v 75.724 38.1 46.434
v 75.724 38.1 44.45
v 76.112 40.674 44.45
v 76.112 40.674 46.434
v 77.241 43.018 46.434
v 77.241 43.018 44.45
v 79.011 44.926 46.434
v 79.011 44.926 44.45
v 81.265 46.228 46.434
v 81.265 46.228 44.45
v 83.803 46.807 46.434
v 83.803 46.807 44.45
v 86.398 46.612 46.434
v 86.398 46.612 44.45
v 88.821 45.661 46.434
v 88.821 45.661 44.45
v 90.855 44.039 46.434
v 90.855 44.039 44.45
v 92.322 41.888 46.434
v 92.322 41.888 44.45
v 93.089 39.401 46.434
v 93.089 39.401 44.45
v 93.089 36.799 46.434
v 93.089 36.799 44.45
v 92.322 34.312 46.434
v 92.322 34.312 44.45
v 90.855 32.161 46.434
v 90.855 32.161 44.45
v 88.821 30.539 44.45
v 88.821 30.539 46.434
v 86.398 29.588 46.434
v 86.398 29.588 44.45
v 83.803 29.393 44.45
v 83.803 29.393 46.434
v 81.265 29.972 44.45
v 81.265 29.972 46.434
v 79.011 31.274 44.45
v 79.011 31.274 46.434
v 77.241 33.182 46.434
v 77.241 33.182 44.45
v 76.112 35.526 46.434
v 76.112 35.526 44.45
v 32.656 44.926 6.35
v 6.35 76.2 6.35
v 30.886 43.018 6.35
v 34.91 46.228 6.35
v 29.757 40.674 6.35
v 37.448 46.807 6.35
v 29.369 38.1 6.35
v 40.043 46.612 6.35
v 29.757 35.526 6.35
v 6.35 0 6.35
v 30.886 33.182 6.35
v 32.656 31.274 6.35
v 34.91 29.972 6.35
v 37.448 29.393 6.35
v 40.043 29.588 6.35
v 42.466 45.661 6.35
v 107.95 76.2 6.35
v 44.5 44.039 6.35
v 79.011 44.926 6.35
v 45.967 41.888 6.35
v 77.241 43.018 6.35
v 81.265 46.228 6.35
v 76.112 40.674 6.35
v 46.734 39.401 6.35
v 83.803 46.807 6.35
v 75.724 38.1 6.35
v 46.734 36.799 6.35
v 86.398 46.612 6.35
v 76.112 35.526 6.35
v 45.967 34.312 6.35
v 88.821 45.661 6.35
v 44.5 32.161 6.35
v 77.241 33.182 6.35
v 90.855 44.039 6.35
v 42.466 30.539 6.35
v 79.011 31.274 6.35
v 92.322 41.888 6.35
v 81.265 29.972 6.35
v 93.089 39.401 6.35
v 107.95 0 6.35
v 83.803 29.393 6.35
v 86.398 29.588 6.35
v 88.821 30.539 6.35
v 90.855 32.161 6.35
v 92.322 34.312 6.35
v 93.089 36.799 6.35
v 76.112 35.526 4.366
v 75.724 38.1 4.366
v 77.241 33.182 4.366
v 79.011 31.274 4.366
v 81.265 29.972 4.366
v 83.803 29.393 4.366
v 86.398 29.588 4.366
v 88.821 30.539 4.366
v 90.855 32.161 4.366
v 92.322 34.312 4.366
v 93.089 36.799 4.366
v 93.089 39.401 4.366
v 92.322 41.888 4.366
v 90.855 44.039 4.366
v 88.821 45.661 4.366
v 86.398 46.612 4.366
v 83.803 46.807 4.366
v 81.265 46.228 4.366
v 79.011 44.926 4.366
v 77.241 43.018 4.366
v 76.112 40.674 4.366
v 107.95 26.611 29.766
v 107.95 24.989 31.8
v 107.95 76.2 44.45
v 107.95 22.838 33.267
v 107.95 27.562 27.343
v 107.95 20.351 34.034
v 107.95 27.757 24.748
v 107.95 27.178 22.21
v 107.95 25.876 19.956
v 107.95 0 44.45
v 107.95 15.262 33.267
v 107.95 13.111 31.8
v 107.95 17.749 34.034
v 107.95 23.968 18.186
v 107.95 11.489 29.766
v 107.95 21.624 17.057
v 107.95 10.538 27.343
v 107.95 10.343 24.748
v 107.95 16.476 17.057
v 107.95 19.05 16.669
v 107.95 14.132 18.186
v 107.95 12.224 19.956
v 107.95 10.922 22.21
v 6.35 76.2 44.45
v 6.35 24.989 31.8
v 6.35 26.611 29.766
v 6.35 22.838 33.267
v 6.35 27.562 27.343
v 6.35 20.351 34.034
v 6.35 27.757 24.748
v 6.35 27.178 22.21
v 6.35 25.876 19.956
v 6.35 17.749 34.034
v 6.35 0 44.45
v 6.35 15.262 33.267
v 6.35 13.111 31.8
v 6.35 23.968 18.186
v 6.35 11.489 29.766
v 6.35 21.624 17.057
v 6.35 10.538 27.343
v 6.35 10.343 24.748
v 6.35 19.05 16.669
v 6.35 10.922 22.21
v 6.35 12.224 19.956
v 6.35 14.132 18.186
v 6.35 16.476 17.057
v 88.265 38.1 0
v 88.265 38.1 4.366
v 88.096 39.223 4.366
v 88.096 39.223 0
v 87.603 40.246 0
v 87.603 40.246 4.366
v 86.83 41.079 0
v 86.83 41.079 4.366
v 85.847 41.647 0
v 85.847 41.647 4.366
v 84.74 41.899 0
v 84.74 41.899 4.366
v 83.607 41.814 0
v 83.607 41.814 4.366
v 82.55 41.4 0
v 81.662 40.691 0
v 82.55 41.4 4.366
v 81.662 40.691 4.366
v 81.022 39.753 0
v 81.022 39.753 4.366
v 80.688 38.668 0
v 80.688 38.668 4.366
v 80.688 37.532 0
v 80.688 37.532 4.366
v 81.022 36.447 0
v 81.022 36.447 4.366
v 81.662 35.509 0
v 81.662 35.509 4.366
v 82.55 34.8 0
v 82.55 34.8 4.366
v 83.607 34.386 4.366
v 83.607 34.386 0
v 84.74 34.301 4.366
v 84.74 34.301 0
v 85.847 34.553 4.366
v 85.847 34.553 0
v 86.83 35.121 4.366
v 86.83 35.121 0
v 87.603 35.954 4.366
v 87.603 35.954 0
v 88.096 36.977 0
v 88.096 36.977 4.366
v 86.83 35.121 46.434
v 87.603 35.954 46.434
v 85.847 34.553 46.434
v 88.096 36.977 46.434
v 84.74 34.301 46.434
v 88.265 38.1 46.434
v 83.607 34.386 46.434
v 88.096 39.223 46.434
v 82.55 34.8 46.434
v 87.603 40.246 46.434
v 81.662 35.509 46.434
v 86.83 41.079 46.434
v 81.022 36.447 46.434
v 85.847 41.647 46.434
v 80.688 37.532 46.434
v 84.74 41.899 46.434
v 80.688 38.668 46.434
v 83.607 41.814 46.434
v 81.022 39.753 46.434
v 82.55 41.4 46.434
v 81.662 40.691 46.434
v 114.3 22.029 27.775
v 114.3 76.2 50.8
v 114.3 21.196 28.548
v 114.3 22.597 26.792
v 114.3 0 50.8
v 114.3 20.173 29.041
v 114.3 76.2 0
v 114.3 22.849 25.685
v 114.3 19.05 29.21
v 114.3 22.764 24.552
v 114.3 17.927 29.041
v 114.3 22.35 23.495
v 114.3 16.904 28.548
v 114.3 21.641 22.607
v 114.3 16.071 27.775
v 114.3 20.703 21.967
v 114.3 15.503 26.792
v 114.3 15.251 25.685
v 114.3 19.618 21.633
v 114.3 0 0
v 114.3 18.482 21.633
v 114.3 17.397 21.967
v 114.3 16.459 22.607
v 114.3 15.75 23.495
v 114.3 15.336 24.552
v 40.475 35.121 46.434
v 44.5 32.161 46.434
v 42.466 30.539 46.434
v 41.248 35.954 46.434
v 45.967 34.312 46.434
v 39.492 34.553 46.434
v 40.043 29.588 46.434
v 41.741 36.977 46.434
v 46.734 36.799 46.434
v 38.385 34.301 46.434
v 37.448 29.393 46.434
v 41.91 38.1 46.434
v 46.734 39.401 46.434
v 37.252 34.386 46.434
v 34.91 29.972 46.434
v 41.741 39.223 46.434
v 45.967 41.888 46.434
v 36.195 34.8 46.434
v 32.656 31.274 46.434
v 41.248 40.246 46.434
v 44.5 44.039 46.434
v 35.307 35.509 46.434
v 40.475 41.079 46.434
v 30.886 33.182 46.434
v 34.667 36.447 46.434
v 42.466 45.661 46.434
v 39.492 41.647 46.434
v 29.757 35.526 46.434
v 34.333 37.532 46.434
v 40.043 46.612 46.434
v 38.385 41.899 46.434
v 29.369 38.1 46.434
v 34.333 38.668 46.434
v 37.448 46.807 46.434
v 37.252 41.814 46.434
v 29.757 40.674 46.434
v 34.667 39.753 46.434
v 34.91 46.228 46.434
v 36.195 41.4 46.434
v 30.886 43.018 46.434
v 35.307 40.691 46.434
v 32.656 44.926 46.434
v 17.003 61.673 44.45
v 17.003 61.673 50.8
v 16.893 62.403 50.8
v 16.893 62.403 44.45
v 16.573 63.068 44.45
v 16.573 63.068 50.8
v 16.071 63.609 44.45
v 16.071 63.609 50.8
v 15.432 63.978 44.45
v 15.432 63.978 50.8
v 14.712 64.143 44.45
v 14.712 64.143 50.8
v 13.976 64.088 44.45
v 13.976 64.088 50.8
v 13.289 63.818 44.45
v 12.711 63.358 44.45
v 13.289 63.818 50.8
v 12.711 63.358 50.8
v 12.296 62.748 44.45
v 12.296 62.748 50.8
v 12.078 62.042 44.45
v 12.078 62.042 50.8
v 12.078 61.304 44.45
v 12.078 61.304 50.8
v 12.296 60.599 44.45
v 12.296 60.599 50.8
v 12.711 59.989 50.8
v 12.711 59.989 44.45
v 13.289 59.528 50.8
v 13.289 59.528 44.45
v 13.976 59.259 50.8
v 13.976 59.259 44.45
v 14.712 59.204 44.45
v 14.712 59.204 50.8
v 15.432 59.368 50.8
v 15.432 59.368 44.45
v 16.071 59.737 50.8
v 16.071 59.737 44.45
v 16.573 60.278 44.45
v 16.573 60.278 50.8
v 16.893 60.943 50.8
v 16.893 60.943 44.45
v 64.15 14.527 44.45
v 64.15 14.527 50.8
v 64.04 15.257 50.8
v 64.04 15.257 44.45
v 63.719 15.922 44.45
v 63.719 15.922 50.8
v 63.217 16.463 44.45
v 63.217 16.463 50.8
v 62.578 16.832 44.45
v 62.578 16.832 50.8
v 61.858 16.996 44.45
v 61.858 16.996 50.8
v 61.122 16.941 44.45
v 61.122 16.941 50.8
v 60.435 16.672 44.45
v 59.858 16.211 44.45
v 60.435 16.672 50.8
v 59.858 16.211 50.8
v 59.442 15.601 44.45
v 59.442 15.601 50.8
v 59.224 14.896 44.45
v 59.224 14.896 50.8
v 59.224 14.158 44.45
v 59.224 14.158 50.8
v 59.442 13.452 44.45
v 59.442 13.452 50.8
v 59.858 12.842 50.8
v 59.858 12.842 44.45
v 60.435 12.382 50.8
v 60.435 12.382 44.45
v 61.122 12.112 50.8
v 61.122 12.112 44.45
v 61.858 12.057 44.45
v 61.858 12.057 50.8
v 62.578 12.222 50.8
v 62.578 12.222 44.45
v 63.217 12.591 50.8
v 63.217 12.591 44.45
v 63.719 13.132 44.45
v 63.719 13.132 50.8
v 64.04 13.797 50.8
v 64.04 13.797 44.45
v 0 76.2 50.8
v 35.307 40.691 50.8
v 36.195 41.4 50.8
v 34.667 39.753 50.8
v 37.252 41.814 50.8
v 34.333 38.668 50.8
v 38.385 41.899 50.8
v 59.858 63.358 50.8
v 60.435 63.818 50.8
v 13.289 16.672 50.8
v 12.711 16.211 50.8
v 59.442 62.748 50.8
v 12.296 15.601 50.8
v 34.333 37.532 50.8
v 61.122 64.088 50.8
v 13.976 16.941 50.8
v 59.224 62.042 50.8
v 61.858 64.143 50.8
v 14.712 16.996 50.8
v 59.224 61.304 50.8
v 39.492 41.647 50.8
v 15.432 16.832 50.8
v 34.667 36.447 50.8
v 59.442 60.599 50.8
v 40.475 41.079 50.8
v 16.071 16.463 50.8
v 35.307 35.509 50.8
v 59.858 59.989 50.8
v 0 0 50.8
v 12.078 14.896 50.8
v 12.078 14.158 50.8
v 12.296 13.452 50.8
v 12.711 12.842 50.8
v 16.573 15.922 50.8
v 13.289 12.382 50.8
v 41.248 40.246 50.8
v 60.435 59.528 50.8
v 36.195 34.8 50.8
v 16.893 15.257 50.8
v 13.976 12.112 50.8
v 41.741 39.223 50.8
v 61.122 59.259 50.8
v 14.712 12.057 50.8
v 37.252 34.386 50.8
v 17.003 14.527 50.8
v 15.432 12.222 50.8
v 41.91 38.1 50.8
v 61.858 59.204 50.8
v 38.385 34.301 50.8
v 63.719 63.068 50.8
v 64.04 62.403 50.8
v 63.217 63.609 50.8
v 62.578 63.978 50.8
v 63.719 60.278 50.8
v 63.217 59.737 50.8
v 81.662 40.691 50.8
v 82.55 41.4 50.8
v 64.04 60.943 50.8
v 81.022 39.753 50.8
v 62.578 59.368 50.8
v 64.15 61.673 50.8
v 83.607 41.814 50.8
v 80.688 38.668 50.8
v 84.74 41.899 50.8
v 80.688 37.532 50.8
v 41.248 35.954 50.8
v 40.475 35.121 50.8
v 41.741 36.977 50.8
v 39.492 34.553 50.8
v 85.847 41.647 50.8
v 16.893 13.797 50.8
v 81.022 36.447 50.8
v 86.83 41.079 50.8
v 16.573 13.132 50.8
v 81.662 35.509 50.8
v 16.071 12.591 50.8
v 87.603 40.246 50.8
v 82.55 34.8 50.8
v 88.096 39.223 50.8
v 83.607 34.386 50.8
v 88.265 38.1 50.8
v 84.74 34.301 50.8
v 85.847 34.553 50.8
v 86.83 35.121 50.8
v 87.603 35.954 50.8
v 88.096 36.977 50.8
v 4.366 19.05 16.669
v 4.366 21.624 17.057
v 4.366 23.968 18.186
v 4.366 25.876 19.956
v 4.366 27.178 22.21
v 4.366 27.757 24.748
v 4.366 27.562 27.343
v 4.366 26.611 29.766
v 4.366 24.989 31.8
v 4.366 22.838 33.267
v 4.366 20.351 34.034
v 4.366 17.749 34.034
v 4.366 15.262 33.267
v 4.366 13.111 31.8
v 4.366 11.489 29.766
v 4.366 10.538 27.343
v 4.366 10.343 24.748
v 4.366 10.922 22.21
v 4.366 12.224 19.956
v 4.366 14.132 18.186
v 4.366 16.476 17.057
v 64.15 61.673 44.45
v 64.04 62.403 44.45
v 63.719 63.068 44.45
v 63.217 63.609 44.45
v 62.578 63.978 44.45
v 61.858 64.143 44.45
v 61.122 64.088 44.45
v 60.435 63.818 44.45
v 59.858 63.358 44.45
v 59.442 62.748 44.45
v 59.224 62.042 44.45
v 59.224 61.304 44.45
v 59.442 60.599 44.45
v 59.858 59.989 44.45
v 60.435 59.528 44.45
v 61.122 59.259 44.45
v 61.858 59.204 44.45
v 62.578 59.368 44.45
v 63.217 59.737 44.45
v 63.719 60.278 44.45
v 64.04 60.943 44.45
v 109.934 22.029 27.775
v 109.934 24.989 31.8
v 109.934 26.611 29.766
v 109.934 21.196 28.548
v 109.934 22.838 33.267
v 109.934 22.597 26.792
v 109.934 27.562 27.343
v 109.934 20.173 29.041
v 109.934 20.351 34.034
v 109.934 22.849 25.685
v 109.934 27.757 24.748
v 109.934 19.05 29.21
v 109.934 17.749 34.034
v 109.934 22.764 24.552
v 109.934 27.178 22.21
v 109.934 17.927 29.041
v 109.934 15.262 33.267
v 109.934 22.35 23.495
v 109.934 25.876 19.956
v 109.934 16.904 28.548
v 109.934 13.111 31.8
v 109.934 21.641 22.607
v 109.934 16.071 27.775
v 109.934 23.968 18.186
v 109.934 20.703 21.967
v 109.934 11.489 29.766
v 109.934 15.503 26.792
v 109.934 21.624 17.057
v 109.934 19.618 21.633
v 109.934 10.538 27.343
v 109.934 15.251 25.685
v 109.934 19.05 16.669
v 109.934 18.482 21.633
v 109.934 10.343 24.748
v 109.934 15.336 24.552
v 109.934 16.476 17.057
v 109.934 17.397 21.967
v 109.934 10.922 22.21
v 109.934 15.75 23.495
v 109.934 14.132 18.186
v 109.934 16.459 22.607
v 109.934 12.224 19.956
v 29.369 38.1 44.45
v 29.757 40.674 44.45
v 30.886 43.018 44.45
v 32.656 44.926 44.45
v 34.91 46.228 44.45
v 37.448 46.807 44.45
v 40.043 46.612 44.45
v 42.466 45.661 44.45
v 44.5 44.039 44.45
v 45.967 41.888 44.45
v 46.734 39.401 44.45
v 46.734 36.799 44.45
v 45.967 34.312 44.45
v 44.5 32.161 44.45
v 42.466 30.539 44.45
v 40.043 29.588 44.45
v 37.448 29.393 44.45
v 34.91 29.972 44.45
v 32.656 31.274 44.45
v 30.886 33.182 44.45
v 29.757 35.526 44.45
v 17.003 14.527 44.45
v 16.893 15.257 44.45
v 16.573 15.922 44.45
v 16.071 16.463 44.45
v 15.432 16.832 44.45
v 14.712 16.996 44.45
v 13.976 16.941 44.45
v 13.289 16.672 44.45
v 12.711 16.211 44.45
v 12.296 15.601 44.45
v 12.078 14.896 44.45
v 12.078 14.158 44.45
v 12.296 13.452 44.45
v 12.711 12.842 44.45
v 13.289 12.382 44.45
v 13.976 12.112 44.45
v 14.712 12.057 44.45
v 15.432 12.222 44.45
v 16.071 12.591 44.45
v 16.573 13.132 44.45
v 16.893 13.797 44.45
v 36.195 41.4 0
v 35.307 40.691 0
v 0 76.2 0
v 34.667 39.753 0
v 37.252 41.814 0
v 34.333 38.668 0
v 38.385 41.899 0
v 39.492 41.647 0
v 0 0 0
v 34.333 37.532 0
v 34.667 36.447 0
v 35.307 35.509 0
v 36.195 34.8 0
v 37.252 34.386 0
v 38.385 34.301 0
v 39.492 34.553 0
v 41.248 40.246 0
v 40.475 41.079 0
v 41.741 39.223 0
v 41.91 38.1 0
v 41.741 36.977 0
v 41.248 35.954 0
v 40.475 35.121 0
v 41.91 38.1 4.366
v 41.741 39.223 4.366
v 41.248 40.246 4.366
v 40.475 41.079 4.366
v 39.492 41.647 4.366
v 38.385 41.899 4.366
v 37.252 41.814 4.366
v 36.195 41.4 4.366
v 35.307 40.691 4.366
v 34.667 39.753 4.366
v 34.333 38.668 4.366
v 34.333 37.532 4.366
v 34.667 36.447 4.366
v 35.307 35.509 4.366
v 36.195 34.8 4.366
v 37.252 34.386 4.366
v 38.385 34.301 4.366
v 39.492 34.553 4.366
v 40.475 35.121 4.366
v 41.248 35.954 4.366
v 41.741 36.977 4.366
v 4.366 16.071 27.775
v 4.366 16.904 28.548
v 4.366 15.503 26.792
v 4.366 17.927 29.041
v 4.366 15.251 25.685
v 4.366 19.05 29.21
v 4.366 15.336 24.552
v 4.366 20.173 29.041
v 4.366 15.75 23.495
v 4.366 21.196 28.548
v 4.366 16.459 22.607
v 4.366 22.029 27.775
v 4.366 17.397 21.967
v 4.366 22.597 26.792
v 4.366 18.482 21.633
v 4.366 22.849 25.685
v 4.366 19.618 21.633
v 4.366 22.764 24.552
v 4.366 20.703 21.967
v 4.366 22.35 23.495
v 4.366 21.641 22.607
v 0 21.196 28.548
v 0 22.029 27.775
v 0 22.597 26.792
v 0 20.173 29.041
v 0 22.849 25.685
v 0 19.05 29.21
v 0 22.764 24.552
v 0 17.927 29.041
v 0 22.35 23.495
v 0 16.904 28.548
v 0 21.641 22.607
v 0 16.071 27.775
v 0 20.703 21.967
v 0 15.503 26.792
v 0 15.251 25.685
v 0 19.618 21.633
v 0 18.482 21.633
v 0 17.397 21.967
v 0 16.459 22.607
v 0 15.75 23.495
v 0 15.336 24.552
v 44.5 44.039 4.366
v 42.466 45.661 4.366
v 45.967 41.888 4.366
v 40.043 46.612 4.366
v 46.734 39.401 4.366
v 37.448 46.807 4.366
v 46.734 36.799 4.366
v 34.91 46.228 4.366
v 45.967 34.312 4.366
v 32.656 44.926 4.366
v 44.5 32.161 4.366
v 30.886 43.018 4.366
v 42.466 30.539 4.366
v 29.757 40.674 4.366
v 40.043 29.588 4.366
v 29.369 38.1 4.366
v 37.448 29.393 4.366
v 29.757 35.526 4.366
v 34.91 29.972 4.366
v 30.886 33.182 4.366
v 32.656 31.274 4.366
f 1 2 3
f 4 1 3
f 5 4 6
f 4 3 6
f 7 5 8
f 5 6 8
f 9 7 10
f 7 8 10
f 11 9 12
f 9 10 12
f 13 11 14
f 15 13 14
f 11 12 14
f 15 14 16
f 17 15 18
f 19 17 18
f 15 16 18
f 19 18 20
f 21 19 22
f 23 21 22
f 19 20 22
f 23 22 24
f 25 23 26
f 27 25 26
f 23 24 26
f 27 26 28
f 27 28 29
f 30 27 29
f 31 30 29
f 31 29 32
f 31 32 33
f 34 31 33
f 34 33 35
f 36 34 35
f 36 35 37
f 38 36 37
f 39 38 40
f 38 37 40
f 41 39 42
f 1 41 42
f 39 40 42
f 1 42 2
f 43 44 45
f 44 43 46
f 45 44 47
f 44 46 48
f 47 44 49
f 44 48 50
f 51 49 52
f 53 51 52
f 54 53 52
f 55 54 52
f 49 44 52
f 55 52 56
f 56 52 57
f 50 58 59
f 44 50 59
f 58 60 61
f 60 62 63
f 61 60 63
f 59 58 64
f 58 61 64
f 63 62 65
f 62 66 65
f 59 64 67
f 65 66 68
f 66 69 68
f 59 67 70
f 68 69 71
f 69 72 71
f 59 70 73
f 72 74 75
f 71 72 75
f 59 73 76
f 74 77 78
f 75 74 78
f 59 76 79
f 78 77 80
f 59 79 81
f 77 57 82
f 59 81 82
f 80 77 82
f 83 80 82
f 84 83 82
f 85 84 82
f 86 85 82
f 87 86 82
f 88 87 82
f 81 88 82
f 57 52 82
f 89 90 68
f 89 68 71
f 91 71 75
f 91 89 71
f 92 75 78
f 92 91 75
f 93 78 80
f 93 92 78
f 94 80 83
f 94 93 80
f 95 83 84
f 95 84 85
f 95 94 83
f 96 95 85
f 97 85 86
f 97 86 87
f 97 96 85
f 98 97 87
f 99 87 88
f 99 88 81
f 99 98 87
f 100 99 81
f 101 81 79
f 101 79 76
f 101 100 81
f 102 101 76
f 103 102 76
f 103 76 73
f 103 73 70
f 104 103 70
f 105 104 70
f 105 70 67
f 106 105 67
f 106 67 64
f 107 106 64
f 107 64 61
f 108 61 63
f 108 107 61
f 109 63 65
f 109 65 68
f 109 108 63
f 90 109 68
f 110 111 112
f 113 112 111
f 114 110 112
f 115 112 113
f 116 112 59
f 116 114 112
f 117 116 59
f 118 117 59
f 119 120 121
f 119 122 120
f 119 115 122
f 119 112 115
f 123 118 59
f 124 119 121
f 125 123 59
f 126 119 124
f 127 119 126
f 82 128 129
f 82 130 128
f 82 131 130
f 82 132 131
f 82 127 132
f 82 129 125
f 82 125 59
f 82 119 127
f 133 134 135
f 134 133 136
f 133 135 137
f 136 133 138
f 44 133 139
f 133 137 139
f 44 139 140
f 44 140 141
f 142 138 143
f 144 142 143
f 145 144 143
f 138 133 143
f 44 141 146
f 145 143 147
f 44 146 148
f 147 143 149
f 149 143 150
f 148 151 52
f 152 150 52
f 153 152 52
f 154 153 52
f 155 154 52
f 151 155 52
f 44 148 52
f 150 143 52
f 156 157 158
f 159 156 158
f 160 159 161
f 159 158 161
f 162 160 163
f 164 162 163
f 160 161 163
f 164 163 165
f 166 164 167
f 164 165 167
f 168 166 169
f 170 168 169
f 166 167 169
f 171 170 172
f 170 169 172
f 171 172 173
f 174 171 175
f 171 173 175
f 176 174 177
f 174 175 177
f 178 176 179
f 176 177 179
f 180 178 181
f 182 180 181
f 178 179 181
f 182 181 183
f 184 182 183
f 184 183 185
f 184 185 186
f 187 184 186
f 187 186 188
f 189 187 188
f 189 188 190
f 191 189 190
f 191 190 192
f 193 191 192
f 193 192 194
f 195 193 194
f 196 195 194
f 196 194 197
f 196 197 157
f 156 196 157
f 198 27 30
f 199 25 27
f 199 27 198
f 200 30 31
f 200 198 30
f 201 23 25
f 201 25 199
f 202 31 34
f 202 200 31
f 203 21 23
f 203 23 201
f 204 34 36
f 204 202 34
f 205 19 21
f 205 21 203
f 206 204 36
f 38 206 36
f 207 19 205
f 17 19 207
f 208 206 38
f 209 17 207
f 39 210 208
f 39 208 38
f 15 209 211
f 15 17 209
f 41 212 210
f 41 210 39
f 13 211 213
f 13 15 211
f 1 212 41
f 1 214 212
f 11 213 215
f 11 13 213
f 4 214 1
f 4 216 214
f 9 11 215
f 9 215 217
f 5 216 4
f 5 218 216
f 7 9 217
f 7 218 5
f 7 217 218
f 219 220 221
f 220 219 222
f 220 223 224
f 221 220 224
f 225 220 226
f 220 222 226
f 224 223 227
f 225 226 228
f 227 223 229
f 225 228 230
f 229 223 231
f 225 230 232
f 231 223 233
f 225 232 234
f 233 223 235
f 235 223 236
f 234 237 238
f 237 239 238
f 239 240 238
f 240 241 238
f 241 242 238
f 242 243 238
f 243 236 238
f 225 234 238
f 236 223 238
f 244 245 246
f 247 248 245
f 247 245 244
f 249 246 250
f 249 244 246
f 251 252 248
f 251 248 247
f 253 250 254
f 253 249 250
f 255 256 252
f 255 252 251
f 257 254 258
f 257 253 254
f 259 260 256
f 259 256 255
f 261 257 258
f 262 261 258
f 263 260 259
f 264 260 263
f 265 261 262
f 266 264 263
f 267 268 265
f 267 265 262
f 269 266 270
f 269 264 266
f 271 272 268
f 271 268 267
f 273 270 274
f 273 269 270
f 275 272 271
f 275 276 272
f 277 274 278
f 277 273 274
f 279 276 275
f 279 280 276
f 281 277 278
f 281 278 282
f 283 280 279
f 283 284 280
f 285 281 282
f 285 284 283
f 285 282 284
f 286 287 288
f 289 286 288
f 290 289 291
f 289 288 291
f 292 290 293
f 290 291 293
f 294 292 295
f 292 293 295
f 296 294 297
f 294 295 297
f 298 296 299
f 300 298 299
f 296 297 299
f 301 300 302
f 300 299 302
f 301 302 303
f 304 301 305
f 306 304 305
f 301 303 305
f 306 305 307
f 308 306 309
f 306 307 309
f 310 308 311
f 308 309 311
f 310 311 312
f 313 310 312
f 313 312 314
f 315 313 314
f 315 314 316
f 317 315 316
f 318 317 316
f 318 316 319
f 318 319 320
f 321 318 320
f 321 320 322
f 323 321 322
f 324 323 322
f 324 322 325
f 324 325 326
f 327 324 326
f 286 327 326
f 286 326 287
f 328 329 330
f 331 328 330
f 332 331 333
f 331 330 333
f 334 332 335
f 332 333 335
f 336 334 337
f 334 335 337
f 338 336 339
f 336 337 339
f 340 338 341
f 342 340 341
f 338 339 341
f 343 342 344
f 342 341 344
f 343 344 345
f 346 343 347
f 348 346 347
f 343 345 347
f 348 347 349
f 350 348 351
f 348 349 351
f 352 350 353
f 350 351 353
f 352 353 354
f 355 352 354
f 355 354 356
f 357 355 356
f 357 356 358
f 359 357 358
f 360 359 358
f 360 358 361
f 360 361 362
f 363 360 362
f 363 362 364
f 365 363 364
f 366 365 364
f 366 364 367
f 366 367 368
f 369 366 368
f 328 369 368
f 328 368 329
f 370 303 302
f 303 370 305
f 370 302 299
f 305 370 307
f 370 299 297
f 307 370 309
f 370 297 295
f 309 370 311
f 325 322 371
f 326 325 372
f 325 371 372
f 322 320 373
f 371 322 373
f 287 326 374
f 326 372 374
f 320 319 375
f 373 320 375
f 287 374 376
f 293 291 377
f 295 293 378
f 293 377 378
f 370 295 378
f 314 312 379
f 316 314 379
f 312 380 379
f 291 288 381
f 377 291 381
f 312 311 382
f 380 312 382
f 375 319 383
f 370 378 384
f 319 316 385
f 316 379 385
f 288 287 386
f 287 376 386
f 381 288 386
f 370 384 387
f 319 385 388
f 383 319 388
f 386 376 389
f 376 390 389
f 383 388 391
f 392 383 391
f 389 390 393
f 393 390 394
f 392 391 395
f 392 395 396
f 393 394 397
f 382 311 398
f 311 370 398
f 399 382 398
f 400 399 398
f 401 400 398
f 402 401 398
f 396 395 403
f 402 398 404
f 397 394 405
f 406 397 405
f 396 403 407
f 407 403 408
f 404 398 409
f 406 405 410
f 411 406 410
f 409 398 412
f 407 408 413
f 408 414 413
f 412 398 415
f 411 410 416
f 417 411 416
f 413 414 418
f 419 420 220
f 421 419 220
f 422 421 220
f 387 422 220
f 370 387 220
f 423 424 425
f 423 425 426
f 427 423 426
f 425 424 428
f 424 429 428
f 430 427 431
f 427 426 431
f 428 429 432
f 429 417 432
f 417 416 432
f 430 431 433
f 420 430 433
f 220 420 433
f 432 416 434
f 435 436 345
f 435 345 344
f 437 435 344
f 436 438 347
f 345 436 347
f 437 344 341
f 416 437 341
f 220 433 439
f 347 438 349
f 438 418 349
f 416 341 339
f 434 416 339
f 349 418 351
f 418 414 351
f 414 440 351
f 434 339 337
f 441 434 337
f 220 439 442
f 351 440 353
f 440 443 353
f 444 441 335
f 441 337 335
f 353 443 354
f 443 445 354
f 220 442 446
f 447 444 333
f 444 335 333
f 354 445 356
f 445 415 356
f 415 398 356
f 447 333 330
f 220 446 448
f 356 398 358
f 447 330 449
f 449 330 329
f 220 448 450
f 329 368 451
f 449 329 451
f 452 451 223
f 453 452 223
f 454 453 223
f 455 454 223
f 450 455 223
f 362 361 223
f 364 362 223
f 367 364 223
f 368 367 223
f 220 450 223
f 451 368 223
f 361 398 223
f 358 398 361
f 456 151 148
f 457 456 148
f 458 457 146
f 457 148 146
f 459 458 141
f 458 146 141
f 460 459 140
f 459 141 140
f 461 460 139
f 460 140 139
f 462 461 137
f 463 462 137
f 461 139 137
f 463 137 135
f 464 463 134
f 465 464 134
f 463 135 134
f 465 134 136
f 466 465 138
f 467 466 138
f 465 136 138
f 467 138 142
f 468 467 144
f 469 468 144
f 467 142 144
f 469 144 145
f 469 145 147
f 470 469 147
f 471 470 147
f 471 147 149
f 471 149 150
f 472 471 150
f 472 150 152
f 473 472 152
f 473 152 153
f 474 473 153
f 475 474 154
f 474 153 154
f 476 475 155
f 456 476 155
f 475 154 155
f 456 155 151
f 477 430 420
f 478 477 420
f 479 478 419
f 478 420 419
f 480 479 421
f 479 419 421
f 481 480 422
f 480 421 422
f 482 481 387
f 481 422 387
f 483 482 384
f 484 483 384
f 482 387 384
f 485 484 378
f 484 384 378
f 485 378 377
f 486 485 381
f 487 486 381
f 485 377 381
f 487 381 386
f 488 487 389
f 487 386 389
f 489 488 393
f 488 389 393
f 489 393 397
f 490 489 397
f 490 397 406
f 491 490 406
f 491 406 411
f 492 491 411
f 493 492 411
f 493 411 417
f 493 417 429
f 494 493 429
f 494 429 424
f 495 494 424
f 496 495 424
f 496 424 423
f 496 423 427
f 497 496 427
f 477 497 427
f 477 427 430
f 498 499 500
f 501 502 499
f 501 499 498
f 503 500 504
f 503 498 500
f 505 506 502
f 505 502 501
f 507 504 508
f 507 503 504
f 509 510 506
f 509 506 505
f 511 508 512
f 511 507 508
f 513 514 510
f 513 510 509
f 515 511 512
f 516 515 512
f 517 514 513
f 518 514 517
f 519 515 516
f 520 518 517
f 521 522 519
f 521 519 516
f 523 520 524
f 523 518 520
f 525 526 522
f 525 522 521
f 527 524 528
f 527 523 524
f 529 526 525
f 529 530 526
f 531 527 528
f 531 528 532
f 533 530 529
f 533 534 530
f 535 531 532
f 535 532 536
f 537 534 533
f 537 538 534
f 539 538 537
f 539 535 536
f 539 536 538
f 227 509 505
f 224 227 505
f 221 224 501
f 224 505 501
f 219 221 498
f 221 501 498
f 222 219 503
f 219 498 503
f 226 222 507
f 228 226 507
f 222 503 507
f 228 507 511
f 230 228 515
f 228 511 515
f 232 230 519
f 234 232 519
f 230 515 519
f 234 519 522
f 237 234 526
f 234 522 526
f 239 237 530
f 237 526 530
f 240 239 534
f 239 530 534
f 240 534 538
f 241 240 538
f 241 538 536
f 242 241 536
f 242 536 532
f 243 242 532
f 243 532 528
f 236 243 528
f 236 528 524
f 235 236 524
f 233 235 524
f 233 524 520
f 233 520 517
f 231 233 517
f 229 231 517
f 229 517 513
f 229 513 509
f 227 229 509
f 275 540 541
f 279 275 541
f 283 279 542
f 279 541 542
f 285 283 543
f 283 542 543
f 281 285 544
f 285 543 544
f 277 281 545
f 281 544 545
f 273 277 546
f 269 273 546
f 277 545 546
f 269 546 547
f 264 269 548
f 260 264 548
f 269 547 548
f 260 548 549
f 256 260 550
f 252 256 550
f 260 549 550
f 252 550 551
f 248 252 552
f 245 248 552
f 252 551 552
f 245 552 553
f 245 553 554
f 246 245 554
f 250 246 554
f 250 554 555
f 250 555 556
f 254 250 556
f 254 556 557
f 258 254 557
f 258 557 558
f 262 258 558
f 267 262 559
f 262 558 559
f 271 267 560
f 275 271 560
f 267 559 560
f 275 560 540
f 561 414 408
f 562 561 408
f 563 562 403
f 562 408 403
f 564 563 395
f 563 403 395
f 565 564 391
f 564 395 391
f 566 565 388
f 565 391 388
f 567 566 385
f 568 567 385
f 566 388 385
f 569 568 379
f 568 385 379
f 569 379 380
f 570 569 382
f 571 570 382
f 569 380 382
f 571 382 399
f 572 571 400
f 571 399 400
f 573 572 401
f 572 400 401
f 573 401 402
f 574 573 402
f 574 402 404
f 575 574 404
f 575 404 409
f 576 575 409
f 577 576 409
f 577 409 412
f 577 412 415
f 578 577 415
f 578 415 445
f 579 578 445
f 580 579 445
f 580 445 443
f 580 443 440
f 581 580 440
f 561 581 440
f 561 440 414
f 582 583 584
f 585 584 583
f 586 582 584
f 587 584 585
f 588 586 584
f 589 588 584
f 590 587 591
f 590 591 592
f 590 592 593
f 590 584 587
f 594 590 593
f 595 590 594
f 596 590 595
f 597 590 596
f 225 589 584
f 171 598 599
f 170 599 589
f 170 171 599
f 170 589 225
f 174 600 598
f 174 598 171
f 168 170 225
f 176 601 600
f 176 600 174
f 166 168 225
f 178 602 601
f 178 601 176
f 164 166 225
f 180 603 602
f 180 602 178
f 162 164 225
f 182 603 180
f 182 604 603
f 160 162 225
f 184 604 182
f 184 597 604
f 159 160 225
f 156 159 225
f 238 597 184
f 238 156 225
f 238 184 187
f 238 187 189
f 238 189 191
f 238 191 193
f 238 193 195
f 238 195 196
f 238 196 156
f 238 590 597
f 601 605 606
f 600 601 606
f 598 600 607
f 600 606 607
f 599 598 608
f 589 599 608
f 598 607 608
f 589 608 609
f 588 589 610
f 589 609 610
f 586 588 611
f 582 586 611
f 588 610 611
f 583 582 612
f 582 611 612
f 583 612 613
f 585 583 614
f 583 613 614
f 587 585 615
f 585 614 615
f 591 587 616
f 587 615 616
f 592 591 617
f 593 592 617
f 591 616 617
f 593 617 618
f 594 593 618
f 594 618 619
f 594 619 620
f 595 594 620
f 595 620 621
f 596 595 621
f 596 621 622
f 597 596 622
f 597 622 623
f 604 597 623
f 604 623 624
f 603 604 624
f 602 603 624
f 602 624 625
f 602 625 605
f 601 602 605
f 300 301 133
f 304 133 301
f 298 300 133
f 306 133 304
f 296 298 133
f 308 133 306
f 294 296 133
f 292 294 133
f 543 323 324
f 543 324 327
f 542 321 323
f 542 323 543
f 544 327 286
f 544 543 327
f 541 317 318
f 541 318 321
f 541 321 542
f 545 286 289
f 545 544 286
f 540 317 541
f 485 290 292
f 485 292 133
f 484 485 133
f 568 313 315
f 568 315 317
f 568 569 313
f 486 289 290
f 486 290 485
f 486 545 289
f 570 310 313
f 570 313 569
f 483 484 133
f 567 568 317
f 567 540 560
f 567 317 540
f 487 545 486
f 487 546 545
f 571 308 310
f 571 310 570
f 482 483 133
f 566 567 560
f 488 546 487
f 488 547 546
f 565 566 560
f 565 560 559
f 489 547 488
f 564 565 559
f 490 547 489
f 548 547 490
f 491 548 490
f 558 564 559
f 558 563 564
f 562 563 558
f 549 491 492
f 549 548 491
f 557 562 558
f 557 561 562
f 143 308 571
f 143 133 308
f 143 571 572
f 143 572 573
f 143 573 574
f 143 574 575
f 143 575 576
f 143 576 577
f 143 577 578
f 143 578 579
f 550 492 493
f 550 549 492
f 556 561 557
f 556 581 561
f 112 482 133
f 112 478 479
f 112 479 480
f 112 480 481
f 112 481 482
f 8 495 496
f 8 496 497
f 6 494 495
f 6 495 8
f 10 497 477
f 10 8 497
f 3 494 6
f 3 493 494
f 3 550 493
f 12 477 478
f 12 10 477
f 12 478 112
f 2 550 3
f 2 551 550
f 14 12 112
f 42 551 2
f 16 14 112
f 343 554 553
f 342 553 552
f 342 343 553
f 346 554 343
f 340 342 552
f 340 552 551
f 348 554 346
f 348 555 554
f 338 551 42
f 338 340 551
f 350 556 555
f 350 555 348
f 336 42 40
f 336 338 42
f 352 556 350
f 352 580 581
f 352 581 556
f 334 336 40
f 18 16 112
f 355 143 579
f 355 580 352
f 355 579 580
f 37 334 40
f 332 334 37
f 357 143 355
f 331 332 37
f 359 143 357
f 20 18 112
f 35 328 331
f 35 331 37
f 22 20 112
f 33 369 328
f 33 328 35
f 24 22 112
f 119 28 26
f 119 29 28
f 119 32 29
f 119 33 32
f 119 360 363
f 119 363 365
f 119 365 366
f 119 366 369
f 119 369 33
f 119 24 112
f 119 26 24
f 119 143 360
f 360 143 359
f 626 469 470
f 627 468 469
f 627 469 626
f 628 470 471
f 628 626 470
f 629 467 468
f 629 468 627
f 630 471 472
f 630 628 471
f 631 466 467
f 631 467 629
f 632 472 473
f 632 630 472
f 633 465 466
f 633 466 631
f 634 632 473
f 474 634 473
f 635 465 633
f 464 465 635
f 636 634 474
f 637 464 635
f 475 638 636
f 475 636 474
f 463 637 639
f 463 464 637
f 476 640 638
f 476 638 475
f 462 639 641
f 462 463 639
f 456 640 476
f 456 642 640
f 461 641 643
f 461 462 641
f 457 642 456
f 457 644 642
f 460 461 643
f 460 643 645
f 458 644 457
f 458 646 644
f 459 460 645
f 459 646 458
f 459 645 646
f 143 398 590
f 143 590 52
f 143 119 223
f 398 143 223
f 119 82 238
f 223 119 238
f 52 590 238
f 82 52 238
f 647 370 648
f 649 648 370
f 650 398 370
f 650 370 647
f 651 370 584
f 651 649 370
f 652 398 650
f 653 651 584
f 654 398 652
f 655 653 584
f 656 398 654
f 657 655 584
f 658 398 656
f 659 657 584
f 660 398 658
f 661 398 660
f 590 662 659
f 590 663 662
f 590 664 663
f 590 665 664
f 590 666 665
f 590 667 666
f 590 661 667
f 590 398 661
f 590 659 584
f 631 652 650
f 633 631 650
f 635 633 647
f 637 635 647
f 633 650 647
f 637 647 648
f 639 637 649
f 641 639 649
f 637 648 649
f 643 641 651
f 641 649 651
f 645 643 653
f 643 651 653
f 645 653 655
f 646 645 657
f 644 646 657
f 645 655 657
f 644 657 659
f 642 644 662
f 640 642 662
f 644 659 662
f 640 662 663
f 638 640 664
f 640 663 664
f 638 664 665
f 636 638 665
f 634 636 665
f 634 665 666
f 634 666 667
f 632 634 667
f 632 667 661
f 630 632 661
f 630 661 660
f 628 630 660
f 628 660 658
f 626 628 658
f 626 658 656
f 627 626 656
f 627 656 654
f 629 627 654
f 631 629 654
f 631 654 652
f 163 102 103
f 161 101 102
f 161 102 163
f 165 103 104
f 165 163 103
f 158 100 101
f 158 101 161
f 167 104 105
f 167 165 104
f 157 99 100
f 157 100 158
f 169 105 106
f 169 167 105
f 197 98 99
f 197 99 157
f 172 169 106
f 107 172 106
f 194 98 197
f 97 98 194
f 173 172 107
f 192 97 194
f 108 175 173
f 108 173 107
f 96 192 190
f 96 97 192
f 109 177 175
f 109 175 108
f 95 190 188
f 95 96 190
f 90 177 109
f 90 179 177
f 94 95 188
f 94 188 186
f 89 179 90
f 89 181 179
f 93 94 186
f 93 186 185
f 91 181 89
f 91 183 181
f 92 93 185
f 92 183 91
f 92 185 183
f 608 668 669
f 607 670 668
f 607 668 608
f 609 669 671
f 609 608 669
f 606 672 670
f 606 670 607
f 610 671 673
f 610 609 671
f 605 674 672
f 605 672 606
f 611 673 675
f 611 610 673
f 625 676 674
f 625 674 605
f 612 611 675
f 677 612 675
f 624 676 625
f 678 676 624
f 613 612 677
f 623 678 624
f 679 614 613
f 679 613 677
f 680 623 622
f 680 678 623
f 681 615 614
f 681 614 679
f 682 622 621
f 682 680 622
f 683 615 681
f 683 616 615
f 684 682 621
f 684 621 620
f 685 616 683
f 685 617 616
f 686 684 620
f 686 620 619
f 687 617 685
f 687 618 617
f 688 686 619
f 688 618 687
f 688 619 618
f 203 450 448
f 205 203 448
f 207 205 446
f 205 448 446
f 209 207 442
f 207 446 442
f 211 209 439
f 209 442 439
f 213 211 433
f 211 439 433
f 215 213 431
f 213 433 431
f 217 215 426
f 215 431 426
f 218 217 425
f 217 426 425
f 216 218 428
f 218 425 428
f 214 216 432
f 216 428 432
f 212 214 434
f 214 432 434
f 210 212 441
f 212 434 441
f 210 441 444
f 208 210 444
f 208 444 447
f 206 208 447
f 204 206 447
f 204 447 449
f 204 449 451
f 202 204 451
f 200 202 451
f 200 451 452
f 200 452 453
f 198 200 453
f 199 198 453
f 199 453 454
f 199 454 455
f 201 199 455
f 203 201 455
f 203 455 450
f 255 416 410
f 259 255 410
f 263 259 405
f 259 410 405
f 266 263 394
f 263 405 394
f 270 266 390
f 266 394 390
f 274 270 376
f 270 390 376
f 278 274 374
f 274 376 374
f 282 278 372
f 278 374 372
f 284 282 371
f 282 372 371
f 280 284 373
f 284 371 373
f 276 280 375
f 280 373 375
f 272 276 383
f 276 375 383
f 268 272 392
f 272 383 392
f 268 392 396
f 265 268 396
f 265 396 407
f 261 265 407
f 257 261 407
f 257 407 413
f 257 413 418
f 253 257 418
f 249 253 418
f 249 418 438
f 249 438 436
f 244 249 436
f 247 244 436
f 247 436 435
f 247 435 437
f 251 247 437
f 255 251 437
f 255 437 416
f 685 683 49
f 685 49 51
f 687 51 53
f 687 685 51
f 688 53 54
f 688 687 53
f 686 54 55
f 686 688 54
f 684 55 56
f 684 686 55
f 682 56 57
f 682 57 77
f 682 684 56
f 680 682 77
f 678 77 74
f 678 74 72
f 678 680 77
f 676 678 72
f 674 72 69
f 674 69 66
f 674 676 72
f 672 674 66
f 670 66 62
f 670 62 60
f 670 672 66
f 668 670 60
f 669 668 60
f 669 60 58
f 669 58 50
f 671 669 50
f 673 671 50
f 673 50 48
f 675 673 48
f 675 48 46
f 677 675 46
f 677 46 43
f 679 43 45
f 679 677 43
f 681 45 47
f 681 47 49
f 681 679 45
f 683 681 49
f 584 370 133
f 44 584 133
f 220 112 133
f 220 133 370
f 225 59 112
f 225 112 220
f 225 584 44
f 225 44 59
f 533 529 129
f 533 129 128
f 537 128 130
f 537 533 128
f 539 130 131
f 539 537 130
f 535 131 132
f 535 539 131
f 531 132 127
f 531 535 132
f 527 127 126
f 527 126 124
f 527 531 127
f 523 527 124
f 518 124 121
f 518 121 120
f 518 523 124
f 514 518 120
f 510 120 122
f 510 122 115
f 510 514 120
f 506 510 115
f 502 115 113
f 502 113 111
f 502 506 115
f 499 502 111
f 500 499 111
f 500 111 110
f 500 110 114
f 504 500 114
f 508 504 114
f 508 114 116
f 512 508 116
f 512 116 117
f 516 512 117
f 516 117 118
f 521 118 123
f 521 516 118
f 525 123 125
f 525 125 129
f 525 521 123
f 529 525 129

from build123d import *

# Parameters (mm, degrees)
SKETCH1_W           = 114.3
SKETCH1_H           = 50.8
SKETCH1_W_2         = 101.6
SKETCH1_H_2         = 38.1
BOSS_EXTRUDE1_DEPTH = 76.2
CUT_EXTRUDE1_REACH  = 148.464
SKETCH2_R           = 2.4765
SKETCH2_5_R         = 3.81
CUT_EXTRUDE2_DEPTH  = 147.463544952
SKETCH5_R           = 3.81
CUT_EXTRUDE4_DEPTH  = 147.463544952
SKETCH6_R           = 3.81
CUT_EXTRUDE5_DEPTH  = 147.463544952
SKETCH7_R           = 8.73125
CUT_EXTRUDE6_DEPTH  = 1.984375
SKETCH8_R           = 8.73125
CUT_EXTRUDE7_DEPTH  = 1.984375
CUT_EXTRUDE8_START  = -1.984375
SKETCH9_R           = 8.73125
CUT_EXTRUDE8_DEPTH  = 1.984375
CUT_EXTRUDE9_START  = -1.984375
SKETCH10_R          = 8.73125
CUT_EXTRUDE9_DEPTH  = 1.984375


with BuildPart() as part:
    # Sketch1 → Boss-Extrude1 (new body)
    with BuildSketch(Plane(origin=(0, 0, 0), x_dir=(1, 0, 0), z_dir=(0, 1, 0))):
        with Locations((57.15, -25.4)):
            Rectangle(SKETCH1_W, SKETCH1_H)
        with Locations((57.15, -25.4)):
            Rectangle(SKETCH1_W_2, SKETCH1_H_2, mode=Mode.SUBTRACT)
    extrude(amount=BOSS_EXTRUDE1_DEPTH)

    # Sketch2 → Cut-Extrude1 (cut, up to next)
    with BuildSketch(Plane.XY.offset(50.8), mode=Mode.PRIVATE) as cut_extrude1_sk1:
        with Locations((14.526827682, 61.673172318)):
            Circle(SKETCH2_R)
    cut_extrude1_tool1 = extrude(cut_extrude1_sk1.sketch, amount=-CUT_EXTRUDE1_REACH, mode=Mode.PRIVATE) & part.part
    # Sketch2 → Cut-Extrude1 (cut, up to next)
    with BuildSketch(Plane.XY.offset(50.8), mode=Mode.PRIVATE) as cut_extrude1_sk2:
        with Locations((61.673172318, 61.673172318)):
            Circle(SKETCH2_R)
    cut_extrude1_tool2 = extrude(cut_extrude1_sk2.sketch, amount=-CUT_EXTRUDE1_REACH, mode=Mode.PRIVATE) & part.part
    # Sketch2 → Cut-Extrude1 (cut, up to next)
    with BuildSketch(Plane.XY.offset(50.8), mode=Mode.PRIVATE) as cut_extrude1_sk3:
        with Locations((61.673172318, 14.526827682)):
            Circle(SKETCH2_R)
    cut_extrude1_tool3 = extrude(cut_extrude1_sk3.sketch, amount=-CUT_EXTRUDE1_REACH, mode=Mode.PRIVATE) & part.part
    # Sketch2 → Cut-Extrude1 (cut, up to next)
    with BuildSketch(Plane.XY.offset(50.8), mode=Mode.PRIVATE) as cut_extrude1_sk4:
        with Locations((14.526827682, 14.526827682)):
            Circle(SKETCH2_R)
    cut_extrude1_tool4 = extrude(cut_extrude1_sk4.sketch, amount=-CUT_EXTRUDE1_REACH, mode=Mode.PRIVATE) & part.part
    add(cut_extrude1_tool1.solids().sort_by_distance((14.526828, 61.673172, 50.8))[0], mode=Mode.SUBTRACT)
    add(cut_extrude1_tool2.solids().sort_by_distance((61.673172, 61.673172, 50.8))[0], mode=Mode.SUBTRACT)
    add(cut_extrude1_tool3.solids().sort_by_distance((61.673172, 14.526828, 50.8))[0], mode=Mode.SUBTRACT)
    add(cut_extrude1_tool4.solids().sort_by_distance((14.526828, 14.526828, 50.8))[0], mode=Mode.SUBTRACT)

    # Sketch2<5> → Cut-Extrude2 (cut, through all)
    with BuildSketch(Plane.XY.offset(50.8)):
        with Locations((38.1, 38.1)):
            Circle(SKETCH2_5_R)
    extrude(amount=-CUT_EXTRUDE2_DEPTH, mode=Mode.SUBTRACT)

    # Sketch5 → Cut-Extrude4 (cut, through all)
    with BuildSketch(Plane.XY.offset(50.8)):
        with Locations((84.455, 38.1)):
            Circle(SKETCH5_R)
    extrude(amount=-CUT_EXTRUDE4_DEPTH, mode=Mode.SUBTRACT)

    # Sketch6 → Cut-Extrude5 (cut, through all)
    with BuildSketch(Plane.ZY):
        with Locations((25.4, 19.05)):
            Circle(SKETCH6_R)
    extrude(amount=-CUT_EXTRUDE5_DEPTH, mode=Mode.SUBTRACT)

    # Sketch7 → Cut-Extrude6 (cut)
    with BuildSketch(Plane(origin=(6.35, 0, 0), x_dir=(0, 0, -1), z_dir=(1, 0, 0))):
        with Locations((-25.4, 19.05)):
            Circle(SKETCH7_R)
    extrude(amount=-CUT_EXTRUDE6_DEPTH, mode=Mode.SUBTRACT)

    # Sketch8 → Cut-Extrude7 (cut)
    with BuildSketch(Plane(origin=(0, 0, 44.45), x_dir=(-1, 0, 0), z_dir=(0, 0, -1))):
        with Locations((-38.1, 38.1)):
            Circle(SKETCH8_R)
        with Locations((-84.455, 38.1)):
            Circle(SKETCH8_R)
    extrude(amount=-CUT_EXTRUDE7_DEPTH, mode=Mode.SUBTRACT)

    # Sketch9 → Cut-Extrude8 (cut)
    with BuildSketch(Plane.ZY.offset(-107.95).offset(CUT_EXTRUDE8_START)):
        with Locations((25.4, 19.05)):
            Circle(SKETCH9_R)
    extrude(amount=CUT_EXTRUDE8_DEPTH, mode=Mode.SUBTRACT)

    # Sketch10 → Cut-Extrude9 (cut)
    with BuildSketch(Plane.XY.offset(6.35).offset(CUT_EXTRUDE9_START)):
        with Locations((38.1, 38.1)):
            Circle(SKETCH10_R)
        with Locations((84.455, 38.1)):
            Circle(SKETCH10_R)
    extrude(amount=CUT_EXTRUDE9_DEPTH, mode=Mode.SUBTRACT)


solid = part.part
